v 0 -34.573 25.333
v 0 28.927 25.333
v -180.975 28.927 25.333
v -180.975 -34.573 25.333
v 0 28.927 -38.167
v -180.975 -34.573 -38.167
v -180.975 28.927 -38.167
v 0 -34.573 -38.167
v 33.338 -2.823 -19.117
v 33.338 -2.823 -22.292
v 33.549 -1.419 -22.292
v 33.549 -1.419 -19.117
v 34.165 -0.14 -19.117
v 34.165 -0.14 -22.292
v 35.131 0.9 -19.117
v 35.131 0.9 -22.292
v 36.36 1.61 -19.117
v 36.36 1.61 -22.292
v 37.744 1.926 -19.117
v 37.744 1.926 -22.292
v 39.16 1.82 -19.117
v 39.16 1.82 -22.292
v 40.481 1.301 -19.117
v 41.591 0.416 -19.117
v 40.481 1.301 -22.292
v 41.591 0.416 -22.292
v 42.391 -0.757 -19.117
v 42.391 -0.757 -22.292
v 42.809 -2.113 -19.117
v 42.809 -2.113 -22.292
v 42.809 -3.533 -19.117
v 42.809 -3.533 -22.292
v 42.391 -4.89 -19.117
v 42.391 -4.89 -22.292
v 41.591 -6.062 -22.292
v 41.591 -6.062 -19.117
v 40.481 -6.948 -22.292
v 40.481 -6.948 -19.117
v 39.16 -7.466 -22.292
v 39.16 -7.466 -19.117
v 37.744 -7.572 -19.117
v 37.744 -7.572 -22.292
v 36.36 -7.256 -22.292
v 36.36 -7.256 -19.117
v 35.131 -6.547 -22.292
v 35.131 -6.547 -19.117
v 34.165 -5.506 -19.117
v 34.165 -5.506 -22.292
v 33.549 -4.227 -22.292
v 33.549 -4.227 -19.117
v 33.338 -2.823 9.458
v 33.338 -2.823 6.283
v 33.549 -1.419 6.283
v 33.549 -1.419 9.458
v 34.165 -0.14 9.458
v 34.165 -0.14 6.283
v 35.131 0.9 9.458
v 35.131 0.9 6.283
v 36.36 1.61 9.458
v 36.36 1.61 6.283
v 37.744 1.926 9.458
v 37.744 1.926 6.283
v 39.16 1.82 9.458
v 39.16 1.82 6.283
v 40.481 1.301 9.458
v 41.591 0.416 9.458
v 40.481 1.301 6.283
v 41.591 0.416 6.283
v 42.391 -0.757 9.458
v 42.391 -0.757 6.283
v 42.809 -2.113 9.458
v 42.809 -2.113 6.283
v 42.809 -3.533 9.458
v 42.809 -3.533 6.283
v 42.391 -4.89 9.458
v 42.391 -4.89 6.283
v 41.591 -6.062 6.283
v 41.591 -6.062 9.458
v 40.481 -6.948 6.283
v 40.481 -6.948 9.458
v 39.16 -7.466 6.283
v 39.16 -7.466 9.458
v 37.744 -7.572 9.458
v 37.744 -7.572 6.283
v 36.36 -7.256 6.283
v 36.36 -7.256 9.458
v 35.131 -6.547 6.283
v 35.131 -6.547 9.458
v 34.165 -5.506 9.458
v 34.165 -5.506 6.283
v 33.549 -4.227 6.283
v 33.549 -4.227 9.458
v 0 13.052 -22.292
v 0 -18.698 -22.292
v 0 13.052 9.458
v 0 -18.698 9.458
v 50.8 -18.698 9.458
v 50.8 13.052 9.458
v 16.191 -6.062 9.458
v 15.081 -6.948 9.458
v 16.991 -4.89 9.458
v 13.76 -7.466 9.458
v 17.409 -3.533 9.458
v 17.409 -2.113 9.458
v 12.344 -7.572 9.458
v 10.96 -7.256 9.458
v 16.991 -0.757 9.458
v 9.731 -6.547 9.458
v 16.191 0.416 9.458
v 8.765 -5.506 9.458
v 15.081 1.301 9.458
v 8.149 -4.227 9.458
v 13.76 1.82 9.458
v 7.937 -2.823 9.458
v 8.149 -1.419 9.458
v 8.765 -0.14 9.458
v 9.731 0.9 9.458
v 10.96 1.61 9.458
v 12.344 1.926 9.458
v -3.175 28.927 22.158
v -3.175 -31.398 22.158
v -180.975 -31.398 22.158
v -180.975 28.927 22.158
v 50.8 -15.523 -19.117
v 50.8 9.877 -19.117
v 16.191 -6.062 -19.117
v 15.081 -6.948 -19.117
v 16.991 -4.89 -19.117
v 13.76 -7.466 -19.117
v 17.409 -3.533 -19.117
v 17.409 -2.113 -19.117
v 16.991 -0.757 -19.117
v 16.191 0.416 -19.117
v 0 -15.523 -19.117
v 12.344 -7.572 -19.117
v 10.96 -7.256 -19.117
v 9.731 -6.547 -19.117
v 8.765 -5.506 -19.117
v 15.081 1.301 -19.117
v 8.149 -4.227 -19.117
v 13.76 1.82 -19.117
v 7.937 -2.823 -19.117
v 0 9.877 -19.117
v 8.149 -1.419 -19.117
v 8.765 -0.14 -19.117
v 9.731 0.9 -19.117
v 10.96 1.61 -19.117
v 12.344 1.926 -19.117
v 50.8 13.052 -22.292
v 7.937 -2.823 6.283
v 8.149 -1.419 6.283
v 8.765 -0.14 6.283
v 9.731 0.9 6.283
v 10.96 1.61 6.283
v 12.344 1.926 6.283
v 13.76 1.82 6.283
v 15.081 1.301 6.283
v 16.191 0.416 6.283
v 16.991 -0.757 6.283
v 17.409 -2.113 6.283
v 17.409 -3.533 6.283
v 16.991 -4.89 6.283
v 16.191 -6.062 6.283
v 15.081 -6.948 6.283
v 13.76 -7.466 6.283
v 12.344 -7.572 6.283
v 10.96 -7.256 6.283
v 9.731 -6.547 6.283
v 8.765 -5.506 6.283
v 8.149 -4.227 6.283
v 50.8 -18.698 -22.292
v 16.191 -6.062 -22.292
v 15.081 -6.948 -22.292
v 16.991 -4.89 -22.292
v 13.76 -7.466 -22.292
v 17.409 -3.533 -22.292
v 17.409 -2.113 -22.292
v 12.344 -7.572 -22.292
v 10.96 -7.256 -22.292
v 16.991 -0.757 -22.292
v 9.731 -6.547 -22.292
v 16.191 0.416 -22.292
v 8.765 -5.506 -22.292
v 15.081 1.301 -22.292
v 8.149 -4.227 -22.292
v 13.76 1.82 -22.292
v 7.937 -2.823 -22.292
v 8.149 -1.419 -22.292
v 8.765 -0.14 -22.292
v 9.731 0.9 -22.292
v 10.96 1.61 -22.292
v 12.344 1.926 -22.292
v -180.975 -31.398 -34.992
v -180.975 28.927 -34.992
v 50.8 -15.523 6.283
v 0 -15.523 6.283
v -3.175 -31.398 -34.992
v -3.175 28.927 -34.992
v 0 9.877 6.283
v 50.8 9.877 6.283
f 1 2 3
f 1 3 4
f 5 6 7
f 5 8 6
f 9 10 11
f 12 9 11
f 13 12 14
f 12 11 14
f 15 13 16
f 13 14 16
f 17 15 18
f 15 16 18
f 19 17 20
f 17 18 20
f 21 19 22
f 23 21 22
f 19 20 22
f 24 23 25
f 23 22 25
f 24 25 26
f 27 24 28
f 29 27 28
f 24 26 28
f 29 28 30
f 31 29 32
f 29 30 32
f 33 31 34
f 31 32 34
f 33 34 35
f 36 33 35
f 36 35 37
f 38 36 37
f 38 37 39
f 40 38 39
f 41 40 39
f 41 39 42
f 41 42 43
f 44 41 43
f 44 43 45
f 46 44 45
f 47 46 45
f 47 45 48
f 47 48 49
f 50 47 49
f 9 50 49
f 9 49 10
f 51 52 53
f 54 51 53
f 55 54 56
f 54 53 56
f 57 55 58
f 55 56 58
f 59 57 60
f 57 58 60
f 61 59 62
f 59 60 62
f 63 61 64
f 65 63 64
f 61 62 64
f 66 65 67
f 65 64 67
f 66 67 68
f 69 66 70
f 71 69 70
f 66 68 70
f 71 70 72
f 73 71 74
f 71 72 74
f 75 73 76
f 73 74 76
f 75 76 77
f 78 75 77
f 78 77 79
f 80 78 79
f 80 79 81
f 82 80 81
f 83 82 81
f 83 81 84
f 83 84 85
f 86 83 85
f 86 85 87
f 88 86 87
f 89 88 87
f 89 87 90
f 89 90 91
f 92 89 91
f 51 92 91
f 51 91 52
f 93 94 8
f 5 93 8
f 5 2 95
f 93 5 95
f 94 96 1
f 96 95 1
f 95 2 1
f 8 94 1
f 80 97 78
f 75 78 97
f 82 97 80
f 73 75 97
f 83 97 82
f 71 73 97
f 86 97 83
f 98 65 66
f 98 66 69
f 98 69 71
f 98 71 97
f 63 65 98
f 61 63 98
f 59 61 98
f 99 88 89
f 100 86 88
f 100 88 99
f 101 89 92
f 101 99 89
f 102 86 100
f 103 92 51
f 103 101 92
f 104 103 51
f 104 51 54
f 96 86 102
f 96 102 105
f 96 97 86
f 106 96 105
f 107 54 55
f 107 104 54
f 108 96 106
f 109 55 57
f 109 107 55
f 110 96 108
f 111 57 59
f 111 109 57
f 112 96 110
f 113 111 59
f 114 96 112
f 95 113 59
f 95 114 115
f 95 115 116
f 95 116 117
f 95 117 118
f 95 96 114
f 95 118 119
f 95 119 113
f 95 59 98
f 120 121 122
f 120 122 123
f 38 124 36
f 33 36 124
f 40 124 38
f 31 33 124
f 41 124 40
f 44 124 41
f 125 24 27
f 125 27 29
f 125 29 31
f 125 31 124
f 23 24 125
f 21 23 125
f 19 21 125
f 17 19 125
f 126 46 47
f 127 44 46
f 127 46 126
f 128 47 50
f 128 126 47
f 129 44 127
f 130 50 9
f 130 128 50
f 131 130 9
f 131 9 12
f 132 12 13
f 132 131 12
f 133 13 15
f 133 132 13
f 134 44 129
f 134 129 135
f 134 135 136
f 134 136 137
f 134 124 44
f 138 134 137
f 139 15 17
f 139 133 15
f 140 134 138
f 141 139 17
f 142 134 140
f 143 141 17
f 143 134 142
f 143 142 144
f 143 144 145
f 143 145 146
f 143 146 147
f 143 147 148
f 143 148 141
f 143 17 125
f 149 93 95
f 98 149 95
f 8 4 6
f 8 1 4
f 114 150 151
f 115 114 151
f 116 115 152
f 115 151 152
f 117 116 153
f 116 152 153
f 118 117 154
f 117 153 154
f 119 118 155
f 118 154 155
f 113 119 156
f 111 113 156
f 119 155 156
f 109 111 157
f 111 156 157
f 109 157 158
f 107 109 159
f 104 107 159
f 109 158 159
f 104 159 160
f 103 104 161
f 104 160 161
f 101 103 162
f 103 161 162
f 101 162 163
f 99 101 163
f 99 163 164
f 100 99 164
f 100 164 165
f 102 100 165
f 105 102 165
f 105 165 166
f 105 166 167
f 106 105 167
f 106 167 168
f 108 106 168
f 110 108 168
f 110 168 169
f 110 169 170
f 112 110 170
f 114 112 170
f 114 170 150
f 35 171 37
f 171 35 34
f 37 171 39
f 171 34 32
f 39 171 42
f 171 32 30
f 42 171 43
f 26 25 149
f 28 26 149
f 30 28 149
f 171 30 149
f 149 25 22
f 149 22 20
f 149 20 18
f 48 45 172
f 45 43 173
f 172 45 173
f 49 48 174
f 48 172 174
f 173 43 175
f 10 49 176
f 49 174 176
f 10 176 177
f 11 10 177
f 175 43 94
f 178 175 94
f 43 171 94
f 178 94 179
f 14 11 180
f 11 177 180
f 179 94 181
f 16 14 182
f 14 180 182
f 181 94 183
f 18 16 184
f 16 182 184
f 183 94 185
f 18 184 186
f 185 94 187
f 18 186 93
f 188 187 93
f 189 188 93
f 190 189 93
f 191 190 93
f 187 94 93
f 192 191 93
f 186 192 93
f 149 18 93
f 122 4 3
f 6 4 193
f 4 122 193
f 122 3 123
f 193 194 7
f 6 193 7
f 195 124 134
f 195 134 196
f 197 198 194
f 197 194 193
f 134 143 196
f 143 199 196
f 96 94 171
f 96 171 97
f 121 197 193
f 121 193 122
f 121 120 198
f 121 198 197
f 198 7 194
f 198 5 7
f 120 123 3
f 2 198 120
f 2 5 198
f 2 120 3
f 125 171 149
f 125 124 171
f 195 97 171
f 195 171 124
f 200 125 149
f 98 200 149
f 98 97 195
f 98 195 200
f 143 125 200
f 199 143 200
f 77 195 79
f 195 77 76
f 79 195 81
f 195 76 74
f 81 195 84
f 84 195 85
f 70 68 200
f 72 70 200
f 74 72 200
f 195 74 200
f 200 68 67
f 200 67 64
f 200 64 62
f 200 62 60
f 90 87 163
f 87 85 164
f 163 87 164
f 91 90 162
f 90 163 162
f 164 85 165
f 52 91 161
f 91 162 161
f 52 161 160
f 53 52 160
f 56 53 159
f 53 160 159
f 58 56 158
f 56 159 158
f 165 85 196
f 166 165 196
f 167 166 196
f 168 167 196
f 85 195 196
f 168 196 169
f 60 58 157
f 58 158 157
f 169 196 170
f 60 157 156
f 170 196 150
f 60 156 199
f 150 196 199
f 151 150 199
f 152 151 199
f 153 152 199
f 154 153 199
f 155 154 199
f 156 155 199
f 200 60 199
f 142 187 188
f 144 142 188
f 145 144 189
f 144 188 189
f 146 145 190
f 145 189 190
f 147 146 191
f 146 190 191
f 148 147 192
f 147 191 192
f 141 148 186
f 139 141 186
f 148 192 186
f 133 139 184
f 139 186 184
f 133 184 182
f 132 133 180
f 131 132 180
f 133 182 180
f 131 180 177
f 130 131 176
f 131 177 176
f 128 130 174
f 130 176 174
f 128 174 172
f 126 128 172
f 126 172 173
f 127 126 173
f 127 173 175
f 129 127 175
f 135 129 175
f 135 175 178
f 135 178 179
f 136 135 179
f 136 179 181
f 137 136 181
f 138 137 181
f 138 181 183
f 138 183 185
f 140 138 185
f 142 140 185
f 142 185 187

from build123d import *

# Parameters (mm, degrees)
SKETCH1_W                       = 31.75
SKETCH1_H                       = 31.75
SKETCH1_W_2                     = 25.4
SKETCH1_H_2                     = 25.4
BOSS_EXTRUDE1_DEPTH             = 50.8
SKETCH2_W                       = 63.5
SKETCH2_H                       = 63.5
BOSS_EXTRUDE2_DEPTH             = 3.175
F_97_0_375_DIAMETER_HOLE1_D     = 9.525
F_97_0_375_DIAMETER_HOLE1_DEPTH = 76.2
BOSS_EXTRUDE3_DEPTH             = 177.8


with BuildPart() as part:
    # Sketch1 → Boss-Extrude1 (new body)
    with BuildSketch(Plane.YZ):
        with Locations((-2.823153034, -6.41701847)):
            Rectangle(SKETCH1_W, SKETCH1_H)
        with Locations((-2.823153034, -6.41701847)):
            Rectangle(SKETCH1_W_2, SKETCH1_H_2, mode=Mode.SUBTRACT)
    extrude(amount=BOSS_EXTRUDE1_DEPTH)

    # Sketch2 → Boss-Extrude2 (add)
    with BuildSketch(Plane(origin=(0, 0, 0), x_dir=(0, -1, 0), z_dir=(-1, 0, 0))):
        with Locations((2.823153034, -6.41701847)):
            Rectangle(SKETCH2_W, SKETCH2_H)
    extrude(amount=BOSS_EXTRUDE2_DEPTH)

    # #97 (0.375) Diameter Hole1
    with Locations(Plane.XY.offset(9.45798153)):
        with Locations((38.1, -2.823153034), (12.7, -2.823153034)):
            Hole(F_97_0_375_DIAMETER_HOLE1_D / 2, depth=F_97_0_375_DIAMETER_HOLE1_DEPTH)

    # Sketch7 → Boss-Extrude3 (add)
    with BuildSketch(Plane.ZY.offset(3.175)):
        Polygon((-38.16701847, 28.926846966), (-34.99201847, 28.926846966), (-34.99201847, -31.398153034), (22.15798153, -31.398153034), (22.15798153, 28.926846966), (25.33298153, 28.926846966), (25.33298153, -34.573153034), (-38.16701847, -34.573153034), align=None)
    extrude(amount=BOSS_EXTRUDE3_DEPTH)


solid = part.part
